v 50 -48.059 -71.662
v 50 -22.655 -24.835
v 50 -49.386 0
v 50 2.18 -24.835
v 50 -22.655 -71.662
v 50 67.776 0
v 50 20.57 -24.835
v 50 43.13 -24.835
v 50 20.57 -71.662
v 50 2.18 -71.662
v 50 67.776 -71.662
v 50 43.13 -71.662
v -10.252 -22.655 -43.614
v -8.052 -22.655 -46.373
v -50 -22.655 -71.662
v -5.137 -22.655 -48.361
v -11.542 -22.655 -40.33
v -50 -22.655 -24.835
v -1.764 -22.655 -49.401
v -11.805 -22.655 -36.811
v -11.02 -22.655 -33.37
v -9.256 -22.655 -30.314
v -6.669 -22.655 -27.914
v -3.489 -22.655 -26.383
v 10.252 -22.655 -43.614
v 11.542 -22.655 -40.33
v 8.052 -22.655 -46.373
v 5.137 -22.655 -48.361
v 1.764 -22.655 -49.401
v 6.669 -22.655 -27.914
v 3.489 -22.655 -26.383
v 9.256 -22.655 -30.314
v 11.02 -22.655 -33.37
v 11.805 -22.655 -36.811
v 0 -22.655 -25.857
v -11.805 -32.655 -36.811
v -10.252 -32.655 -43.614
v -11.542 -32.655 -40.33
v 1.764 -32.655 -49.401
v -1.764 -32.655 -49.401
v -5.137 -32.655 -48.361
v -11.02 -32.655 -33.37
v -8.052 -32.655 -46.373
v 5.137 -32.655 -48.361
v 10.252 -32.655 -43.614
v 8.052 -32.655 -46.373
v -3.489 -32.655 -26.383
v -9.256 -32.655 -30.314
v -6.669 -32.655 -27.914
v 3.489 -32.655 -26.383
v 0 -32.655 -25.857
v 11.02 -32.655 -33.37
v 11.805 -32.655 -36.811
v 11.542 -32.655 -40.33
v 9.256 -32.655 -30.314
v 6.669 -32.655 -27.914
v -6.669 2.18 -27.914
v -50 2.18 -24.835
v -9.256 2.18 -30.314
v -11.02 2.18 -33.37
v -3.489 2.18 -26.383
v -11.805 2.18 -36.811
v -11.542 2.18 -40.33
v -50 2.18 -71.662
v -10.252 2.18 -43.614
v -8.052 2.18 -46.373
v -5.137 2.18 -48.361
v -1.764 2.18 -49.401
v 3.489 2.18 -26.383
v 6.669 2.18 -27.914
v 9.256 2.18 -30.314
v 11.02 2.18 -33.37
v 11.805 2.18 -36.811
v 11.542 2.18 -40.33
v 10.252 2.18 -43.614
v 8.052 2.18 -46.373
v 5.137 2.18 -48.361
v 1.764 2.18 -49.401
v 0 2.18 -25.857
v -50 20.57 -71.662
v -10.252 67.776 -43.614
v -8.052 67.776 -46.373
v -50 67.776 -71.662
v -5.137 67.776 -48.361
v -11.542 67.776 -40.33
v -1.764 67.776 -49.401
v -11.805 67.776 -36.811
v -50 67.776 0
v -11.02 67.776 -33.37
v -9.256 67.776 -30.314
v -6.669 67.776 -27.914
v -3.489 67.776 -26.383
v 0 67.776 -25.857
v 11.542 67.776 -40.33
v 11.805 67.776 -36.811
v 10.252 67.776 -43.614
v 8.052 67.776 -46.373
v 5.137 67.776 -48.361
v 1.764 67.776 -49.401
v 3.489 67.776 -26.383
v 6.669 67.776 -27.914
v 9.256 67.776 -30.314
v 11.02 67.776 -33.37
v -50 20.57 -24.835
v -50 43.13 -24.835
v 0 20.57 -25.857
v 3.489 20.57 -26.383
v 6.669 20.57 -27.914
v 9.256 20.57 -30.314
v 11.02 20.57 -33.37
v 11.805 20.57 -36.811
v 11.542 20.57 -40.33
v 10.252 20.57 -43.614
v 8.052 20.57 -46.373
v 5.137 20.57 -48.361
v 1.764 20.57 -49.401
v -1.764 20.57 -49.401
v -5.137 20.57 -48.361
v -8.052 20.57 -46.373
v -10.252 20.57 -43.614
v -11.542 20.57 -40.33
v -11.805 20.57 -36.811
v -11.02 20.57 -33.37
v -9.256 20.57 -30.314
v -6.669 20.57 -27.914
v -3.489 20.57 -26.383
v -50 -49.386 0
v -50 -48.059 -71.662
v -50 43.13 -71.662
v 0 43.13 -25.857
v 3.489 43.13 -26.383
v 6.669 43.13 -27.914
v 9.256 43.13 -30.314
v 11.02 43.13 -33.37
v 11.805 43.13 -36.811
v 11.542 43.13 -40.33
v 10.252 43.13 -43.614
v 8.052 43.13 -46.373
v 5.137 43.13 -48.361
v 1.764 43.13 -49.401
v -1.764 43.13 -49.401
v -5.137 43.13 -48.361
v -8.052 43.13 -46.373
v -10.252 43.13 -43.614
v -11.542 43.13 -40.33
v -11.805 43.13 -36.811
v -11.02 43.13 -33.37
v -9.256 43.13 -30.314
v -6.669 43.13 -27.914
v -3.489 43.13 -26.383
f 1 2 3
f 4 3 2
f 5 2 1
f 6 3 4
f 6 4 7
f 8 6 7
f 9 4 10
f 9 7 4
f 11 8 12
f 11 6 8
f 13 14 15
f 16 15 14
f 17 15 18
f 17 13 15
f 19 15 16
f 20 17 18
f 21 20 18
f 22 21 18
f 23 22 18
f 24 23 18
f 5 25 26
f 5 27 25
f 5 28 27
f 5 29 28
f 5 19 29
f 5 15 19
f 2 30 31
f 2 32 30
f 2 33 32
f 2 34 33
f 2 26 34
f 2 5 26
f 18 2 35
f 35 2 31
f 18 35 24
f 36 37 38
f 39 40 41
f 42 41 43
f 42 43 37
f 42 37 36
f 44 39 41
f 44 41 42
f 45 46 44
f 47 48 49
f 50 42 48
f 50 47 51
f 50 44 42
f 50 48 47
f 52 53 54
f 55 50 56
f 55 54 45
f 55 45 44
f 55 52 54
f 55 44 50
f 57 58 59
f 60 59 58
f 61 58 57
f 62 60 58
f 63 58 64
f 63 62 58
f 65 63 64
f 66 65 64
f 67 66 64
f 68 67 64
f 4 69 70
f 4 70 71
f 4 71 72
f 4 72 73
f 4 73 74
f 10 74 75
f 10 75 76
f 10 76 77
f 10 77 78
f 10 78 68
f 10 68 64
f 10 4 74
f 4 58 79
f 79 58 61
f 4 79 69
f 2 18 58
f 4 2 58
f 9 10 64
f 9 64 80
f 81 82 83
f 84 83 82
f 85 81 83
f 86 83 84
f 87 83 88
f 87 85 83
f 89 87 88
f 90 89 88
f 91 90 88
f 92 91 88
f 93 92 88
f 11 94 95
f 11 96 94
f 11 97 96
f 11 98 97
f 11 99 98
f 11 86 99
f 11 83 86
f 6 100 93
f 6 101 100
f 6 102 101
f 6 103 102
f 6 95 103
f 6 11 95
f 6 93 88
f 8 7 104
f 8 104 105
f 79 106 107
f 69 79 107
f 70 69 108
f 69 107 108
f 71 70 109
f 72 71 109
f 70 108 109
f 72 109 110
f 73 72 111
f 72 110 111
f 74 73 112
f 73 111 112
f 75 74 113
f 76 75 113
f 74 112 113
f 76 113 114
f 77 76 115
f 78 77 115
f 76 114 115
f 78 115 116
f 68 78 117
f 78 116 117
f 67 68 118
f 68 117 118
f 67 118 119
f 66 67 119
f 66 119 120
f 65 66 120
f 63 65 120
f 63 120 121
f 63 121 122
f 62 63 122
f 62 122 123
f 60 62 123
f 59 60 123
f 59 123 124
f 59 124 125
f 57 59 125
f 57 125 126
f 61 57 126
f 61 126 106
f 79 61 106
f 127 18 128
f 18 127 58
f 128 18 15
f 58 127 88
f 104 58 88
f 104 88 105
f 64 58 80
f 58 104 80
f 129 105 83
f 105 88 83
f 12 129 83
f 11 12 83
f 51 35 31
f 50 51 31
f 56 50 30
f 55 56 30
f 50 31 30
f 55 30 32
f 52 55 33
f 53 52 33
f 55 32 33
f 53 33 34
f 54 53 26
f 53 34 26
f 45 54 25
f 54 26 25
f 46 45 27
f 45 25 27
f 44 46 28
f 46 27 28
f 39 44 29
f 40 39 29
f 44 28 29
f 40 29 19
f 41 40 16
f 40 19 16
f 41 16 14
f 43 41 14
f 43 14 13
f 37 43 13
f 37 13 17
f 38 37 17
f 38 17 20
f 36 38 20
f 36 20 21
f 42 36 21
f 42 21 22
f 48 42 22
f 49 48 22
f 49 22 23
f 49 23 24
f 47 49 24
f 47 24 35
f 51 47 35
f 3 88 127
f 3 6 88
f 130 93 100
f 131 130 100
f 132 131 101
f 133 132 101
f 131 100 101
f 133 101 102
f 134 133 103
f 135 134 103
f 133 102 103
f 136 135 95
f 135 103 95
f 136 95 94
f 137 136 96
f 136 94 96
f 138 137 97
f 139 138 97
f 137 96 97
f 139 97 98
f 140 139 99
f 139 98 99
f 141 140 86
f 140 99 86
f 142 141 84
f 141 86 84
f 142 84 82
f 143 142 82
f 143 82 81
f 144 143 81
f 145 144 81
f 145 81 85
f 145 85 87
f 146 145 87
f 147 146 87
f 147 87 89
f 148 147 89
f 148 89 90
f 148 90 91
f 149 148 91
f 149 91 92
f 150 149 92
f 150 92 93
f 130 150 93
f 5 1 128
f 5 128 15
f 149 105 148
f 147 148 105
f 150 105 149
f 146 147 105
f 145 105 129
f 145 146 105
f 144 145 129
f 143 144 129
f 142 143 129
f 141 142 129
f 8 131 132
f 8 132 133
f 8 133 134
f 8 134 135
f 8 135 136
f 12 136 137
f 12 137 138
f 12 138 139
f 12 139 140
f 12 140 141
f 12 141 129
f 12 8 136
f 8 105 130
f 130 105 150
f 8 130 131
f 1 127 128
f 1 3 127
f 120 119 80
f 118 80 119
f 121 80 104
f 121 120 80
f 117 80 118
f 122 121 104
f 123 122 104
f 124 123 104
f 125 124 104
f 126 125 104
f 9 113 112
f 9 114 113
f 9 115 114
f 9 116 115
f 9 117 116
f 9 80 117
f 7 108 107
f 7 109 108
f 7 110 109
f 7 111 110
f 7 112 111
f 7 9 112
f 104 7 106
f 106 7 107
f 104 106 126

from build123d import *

# Parameters (mm, degrees)
BOSS_EXTRUDE1_DEPTH = 50
SKETCH2_R           = 11.83848923
CUT_EXTRUDE1_DEPTH  = 100.430977097


with BuildPart() as part:
    # Sketch1 → Boss-Extrude1 (new, symmetric)
    with BuildSketch(Plane(origin=(0, 0, 0), x_dir=(0, 0, -1), z_dir=(1, 0, 0))):
        Polygon((0, 53.746712803), (0, -49.386309295), (71.662283737, -48.059229966), (71.662283737, -22.655139964), (24.835341718, -22.655139964), (24.835341718, 2.180201754), (71.662283737, 2.180201754), (71.662283737, 20.569729591), (24.835341718, 20.569729591), (24.835341718, 43.130078175), (71.662283737, 43.130078175), (71.662283737, 67.775837132), (0, 67.775837132), align=None)
    extrude(amount=BOSS_EXTRUDE1_DEPTH, both=True)

    # Sketch2 → Cut-Extrude1 (cut)
    with BuildSketch(Plane(origin=(0, 67.775837132, 0), x_dir=(1, 0, 0), z_dir=(0, 1, 0))):
        with Locations(Location((0, 37.695226778, 0), (0, 0, 270))):
            Circle(SKETCH2_R)
    extrude(amount=-CUT_EXTRUDE1_DEPTH, mode=Mode.SUBTRACT)


solid = part.part
